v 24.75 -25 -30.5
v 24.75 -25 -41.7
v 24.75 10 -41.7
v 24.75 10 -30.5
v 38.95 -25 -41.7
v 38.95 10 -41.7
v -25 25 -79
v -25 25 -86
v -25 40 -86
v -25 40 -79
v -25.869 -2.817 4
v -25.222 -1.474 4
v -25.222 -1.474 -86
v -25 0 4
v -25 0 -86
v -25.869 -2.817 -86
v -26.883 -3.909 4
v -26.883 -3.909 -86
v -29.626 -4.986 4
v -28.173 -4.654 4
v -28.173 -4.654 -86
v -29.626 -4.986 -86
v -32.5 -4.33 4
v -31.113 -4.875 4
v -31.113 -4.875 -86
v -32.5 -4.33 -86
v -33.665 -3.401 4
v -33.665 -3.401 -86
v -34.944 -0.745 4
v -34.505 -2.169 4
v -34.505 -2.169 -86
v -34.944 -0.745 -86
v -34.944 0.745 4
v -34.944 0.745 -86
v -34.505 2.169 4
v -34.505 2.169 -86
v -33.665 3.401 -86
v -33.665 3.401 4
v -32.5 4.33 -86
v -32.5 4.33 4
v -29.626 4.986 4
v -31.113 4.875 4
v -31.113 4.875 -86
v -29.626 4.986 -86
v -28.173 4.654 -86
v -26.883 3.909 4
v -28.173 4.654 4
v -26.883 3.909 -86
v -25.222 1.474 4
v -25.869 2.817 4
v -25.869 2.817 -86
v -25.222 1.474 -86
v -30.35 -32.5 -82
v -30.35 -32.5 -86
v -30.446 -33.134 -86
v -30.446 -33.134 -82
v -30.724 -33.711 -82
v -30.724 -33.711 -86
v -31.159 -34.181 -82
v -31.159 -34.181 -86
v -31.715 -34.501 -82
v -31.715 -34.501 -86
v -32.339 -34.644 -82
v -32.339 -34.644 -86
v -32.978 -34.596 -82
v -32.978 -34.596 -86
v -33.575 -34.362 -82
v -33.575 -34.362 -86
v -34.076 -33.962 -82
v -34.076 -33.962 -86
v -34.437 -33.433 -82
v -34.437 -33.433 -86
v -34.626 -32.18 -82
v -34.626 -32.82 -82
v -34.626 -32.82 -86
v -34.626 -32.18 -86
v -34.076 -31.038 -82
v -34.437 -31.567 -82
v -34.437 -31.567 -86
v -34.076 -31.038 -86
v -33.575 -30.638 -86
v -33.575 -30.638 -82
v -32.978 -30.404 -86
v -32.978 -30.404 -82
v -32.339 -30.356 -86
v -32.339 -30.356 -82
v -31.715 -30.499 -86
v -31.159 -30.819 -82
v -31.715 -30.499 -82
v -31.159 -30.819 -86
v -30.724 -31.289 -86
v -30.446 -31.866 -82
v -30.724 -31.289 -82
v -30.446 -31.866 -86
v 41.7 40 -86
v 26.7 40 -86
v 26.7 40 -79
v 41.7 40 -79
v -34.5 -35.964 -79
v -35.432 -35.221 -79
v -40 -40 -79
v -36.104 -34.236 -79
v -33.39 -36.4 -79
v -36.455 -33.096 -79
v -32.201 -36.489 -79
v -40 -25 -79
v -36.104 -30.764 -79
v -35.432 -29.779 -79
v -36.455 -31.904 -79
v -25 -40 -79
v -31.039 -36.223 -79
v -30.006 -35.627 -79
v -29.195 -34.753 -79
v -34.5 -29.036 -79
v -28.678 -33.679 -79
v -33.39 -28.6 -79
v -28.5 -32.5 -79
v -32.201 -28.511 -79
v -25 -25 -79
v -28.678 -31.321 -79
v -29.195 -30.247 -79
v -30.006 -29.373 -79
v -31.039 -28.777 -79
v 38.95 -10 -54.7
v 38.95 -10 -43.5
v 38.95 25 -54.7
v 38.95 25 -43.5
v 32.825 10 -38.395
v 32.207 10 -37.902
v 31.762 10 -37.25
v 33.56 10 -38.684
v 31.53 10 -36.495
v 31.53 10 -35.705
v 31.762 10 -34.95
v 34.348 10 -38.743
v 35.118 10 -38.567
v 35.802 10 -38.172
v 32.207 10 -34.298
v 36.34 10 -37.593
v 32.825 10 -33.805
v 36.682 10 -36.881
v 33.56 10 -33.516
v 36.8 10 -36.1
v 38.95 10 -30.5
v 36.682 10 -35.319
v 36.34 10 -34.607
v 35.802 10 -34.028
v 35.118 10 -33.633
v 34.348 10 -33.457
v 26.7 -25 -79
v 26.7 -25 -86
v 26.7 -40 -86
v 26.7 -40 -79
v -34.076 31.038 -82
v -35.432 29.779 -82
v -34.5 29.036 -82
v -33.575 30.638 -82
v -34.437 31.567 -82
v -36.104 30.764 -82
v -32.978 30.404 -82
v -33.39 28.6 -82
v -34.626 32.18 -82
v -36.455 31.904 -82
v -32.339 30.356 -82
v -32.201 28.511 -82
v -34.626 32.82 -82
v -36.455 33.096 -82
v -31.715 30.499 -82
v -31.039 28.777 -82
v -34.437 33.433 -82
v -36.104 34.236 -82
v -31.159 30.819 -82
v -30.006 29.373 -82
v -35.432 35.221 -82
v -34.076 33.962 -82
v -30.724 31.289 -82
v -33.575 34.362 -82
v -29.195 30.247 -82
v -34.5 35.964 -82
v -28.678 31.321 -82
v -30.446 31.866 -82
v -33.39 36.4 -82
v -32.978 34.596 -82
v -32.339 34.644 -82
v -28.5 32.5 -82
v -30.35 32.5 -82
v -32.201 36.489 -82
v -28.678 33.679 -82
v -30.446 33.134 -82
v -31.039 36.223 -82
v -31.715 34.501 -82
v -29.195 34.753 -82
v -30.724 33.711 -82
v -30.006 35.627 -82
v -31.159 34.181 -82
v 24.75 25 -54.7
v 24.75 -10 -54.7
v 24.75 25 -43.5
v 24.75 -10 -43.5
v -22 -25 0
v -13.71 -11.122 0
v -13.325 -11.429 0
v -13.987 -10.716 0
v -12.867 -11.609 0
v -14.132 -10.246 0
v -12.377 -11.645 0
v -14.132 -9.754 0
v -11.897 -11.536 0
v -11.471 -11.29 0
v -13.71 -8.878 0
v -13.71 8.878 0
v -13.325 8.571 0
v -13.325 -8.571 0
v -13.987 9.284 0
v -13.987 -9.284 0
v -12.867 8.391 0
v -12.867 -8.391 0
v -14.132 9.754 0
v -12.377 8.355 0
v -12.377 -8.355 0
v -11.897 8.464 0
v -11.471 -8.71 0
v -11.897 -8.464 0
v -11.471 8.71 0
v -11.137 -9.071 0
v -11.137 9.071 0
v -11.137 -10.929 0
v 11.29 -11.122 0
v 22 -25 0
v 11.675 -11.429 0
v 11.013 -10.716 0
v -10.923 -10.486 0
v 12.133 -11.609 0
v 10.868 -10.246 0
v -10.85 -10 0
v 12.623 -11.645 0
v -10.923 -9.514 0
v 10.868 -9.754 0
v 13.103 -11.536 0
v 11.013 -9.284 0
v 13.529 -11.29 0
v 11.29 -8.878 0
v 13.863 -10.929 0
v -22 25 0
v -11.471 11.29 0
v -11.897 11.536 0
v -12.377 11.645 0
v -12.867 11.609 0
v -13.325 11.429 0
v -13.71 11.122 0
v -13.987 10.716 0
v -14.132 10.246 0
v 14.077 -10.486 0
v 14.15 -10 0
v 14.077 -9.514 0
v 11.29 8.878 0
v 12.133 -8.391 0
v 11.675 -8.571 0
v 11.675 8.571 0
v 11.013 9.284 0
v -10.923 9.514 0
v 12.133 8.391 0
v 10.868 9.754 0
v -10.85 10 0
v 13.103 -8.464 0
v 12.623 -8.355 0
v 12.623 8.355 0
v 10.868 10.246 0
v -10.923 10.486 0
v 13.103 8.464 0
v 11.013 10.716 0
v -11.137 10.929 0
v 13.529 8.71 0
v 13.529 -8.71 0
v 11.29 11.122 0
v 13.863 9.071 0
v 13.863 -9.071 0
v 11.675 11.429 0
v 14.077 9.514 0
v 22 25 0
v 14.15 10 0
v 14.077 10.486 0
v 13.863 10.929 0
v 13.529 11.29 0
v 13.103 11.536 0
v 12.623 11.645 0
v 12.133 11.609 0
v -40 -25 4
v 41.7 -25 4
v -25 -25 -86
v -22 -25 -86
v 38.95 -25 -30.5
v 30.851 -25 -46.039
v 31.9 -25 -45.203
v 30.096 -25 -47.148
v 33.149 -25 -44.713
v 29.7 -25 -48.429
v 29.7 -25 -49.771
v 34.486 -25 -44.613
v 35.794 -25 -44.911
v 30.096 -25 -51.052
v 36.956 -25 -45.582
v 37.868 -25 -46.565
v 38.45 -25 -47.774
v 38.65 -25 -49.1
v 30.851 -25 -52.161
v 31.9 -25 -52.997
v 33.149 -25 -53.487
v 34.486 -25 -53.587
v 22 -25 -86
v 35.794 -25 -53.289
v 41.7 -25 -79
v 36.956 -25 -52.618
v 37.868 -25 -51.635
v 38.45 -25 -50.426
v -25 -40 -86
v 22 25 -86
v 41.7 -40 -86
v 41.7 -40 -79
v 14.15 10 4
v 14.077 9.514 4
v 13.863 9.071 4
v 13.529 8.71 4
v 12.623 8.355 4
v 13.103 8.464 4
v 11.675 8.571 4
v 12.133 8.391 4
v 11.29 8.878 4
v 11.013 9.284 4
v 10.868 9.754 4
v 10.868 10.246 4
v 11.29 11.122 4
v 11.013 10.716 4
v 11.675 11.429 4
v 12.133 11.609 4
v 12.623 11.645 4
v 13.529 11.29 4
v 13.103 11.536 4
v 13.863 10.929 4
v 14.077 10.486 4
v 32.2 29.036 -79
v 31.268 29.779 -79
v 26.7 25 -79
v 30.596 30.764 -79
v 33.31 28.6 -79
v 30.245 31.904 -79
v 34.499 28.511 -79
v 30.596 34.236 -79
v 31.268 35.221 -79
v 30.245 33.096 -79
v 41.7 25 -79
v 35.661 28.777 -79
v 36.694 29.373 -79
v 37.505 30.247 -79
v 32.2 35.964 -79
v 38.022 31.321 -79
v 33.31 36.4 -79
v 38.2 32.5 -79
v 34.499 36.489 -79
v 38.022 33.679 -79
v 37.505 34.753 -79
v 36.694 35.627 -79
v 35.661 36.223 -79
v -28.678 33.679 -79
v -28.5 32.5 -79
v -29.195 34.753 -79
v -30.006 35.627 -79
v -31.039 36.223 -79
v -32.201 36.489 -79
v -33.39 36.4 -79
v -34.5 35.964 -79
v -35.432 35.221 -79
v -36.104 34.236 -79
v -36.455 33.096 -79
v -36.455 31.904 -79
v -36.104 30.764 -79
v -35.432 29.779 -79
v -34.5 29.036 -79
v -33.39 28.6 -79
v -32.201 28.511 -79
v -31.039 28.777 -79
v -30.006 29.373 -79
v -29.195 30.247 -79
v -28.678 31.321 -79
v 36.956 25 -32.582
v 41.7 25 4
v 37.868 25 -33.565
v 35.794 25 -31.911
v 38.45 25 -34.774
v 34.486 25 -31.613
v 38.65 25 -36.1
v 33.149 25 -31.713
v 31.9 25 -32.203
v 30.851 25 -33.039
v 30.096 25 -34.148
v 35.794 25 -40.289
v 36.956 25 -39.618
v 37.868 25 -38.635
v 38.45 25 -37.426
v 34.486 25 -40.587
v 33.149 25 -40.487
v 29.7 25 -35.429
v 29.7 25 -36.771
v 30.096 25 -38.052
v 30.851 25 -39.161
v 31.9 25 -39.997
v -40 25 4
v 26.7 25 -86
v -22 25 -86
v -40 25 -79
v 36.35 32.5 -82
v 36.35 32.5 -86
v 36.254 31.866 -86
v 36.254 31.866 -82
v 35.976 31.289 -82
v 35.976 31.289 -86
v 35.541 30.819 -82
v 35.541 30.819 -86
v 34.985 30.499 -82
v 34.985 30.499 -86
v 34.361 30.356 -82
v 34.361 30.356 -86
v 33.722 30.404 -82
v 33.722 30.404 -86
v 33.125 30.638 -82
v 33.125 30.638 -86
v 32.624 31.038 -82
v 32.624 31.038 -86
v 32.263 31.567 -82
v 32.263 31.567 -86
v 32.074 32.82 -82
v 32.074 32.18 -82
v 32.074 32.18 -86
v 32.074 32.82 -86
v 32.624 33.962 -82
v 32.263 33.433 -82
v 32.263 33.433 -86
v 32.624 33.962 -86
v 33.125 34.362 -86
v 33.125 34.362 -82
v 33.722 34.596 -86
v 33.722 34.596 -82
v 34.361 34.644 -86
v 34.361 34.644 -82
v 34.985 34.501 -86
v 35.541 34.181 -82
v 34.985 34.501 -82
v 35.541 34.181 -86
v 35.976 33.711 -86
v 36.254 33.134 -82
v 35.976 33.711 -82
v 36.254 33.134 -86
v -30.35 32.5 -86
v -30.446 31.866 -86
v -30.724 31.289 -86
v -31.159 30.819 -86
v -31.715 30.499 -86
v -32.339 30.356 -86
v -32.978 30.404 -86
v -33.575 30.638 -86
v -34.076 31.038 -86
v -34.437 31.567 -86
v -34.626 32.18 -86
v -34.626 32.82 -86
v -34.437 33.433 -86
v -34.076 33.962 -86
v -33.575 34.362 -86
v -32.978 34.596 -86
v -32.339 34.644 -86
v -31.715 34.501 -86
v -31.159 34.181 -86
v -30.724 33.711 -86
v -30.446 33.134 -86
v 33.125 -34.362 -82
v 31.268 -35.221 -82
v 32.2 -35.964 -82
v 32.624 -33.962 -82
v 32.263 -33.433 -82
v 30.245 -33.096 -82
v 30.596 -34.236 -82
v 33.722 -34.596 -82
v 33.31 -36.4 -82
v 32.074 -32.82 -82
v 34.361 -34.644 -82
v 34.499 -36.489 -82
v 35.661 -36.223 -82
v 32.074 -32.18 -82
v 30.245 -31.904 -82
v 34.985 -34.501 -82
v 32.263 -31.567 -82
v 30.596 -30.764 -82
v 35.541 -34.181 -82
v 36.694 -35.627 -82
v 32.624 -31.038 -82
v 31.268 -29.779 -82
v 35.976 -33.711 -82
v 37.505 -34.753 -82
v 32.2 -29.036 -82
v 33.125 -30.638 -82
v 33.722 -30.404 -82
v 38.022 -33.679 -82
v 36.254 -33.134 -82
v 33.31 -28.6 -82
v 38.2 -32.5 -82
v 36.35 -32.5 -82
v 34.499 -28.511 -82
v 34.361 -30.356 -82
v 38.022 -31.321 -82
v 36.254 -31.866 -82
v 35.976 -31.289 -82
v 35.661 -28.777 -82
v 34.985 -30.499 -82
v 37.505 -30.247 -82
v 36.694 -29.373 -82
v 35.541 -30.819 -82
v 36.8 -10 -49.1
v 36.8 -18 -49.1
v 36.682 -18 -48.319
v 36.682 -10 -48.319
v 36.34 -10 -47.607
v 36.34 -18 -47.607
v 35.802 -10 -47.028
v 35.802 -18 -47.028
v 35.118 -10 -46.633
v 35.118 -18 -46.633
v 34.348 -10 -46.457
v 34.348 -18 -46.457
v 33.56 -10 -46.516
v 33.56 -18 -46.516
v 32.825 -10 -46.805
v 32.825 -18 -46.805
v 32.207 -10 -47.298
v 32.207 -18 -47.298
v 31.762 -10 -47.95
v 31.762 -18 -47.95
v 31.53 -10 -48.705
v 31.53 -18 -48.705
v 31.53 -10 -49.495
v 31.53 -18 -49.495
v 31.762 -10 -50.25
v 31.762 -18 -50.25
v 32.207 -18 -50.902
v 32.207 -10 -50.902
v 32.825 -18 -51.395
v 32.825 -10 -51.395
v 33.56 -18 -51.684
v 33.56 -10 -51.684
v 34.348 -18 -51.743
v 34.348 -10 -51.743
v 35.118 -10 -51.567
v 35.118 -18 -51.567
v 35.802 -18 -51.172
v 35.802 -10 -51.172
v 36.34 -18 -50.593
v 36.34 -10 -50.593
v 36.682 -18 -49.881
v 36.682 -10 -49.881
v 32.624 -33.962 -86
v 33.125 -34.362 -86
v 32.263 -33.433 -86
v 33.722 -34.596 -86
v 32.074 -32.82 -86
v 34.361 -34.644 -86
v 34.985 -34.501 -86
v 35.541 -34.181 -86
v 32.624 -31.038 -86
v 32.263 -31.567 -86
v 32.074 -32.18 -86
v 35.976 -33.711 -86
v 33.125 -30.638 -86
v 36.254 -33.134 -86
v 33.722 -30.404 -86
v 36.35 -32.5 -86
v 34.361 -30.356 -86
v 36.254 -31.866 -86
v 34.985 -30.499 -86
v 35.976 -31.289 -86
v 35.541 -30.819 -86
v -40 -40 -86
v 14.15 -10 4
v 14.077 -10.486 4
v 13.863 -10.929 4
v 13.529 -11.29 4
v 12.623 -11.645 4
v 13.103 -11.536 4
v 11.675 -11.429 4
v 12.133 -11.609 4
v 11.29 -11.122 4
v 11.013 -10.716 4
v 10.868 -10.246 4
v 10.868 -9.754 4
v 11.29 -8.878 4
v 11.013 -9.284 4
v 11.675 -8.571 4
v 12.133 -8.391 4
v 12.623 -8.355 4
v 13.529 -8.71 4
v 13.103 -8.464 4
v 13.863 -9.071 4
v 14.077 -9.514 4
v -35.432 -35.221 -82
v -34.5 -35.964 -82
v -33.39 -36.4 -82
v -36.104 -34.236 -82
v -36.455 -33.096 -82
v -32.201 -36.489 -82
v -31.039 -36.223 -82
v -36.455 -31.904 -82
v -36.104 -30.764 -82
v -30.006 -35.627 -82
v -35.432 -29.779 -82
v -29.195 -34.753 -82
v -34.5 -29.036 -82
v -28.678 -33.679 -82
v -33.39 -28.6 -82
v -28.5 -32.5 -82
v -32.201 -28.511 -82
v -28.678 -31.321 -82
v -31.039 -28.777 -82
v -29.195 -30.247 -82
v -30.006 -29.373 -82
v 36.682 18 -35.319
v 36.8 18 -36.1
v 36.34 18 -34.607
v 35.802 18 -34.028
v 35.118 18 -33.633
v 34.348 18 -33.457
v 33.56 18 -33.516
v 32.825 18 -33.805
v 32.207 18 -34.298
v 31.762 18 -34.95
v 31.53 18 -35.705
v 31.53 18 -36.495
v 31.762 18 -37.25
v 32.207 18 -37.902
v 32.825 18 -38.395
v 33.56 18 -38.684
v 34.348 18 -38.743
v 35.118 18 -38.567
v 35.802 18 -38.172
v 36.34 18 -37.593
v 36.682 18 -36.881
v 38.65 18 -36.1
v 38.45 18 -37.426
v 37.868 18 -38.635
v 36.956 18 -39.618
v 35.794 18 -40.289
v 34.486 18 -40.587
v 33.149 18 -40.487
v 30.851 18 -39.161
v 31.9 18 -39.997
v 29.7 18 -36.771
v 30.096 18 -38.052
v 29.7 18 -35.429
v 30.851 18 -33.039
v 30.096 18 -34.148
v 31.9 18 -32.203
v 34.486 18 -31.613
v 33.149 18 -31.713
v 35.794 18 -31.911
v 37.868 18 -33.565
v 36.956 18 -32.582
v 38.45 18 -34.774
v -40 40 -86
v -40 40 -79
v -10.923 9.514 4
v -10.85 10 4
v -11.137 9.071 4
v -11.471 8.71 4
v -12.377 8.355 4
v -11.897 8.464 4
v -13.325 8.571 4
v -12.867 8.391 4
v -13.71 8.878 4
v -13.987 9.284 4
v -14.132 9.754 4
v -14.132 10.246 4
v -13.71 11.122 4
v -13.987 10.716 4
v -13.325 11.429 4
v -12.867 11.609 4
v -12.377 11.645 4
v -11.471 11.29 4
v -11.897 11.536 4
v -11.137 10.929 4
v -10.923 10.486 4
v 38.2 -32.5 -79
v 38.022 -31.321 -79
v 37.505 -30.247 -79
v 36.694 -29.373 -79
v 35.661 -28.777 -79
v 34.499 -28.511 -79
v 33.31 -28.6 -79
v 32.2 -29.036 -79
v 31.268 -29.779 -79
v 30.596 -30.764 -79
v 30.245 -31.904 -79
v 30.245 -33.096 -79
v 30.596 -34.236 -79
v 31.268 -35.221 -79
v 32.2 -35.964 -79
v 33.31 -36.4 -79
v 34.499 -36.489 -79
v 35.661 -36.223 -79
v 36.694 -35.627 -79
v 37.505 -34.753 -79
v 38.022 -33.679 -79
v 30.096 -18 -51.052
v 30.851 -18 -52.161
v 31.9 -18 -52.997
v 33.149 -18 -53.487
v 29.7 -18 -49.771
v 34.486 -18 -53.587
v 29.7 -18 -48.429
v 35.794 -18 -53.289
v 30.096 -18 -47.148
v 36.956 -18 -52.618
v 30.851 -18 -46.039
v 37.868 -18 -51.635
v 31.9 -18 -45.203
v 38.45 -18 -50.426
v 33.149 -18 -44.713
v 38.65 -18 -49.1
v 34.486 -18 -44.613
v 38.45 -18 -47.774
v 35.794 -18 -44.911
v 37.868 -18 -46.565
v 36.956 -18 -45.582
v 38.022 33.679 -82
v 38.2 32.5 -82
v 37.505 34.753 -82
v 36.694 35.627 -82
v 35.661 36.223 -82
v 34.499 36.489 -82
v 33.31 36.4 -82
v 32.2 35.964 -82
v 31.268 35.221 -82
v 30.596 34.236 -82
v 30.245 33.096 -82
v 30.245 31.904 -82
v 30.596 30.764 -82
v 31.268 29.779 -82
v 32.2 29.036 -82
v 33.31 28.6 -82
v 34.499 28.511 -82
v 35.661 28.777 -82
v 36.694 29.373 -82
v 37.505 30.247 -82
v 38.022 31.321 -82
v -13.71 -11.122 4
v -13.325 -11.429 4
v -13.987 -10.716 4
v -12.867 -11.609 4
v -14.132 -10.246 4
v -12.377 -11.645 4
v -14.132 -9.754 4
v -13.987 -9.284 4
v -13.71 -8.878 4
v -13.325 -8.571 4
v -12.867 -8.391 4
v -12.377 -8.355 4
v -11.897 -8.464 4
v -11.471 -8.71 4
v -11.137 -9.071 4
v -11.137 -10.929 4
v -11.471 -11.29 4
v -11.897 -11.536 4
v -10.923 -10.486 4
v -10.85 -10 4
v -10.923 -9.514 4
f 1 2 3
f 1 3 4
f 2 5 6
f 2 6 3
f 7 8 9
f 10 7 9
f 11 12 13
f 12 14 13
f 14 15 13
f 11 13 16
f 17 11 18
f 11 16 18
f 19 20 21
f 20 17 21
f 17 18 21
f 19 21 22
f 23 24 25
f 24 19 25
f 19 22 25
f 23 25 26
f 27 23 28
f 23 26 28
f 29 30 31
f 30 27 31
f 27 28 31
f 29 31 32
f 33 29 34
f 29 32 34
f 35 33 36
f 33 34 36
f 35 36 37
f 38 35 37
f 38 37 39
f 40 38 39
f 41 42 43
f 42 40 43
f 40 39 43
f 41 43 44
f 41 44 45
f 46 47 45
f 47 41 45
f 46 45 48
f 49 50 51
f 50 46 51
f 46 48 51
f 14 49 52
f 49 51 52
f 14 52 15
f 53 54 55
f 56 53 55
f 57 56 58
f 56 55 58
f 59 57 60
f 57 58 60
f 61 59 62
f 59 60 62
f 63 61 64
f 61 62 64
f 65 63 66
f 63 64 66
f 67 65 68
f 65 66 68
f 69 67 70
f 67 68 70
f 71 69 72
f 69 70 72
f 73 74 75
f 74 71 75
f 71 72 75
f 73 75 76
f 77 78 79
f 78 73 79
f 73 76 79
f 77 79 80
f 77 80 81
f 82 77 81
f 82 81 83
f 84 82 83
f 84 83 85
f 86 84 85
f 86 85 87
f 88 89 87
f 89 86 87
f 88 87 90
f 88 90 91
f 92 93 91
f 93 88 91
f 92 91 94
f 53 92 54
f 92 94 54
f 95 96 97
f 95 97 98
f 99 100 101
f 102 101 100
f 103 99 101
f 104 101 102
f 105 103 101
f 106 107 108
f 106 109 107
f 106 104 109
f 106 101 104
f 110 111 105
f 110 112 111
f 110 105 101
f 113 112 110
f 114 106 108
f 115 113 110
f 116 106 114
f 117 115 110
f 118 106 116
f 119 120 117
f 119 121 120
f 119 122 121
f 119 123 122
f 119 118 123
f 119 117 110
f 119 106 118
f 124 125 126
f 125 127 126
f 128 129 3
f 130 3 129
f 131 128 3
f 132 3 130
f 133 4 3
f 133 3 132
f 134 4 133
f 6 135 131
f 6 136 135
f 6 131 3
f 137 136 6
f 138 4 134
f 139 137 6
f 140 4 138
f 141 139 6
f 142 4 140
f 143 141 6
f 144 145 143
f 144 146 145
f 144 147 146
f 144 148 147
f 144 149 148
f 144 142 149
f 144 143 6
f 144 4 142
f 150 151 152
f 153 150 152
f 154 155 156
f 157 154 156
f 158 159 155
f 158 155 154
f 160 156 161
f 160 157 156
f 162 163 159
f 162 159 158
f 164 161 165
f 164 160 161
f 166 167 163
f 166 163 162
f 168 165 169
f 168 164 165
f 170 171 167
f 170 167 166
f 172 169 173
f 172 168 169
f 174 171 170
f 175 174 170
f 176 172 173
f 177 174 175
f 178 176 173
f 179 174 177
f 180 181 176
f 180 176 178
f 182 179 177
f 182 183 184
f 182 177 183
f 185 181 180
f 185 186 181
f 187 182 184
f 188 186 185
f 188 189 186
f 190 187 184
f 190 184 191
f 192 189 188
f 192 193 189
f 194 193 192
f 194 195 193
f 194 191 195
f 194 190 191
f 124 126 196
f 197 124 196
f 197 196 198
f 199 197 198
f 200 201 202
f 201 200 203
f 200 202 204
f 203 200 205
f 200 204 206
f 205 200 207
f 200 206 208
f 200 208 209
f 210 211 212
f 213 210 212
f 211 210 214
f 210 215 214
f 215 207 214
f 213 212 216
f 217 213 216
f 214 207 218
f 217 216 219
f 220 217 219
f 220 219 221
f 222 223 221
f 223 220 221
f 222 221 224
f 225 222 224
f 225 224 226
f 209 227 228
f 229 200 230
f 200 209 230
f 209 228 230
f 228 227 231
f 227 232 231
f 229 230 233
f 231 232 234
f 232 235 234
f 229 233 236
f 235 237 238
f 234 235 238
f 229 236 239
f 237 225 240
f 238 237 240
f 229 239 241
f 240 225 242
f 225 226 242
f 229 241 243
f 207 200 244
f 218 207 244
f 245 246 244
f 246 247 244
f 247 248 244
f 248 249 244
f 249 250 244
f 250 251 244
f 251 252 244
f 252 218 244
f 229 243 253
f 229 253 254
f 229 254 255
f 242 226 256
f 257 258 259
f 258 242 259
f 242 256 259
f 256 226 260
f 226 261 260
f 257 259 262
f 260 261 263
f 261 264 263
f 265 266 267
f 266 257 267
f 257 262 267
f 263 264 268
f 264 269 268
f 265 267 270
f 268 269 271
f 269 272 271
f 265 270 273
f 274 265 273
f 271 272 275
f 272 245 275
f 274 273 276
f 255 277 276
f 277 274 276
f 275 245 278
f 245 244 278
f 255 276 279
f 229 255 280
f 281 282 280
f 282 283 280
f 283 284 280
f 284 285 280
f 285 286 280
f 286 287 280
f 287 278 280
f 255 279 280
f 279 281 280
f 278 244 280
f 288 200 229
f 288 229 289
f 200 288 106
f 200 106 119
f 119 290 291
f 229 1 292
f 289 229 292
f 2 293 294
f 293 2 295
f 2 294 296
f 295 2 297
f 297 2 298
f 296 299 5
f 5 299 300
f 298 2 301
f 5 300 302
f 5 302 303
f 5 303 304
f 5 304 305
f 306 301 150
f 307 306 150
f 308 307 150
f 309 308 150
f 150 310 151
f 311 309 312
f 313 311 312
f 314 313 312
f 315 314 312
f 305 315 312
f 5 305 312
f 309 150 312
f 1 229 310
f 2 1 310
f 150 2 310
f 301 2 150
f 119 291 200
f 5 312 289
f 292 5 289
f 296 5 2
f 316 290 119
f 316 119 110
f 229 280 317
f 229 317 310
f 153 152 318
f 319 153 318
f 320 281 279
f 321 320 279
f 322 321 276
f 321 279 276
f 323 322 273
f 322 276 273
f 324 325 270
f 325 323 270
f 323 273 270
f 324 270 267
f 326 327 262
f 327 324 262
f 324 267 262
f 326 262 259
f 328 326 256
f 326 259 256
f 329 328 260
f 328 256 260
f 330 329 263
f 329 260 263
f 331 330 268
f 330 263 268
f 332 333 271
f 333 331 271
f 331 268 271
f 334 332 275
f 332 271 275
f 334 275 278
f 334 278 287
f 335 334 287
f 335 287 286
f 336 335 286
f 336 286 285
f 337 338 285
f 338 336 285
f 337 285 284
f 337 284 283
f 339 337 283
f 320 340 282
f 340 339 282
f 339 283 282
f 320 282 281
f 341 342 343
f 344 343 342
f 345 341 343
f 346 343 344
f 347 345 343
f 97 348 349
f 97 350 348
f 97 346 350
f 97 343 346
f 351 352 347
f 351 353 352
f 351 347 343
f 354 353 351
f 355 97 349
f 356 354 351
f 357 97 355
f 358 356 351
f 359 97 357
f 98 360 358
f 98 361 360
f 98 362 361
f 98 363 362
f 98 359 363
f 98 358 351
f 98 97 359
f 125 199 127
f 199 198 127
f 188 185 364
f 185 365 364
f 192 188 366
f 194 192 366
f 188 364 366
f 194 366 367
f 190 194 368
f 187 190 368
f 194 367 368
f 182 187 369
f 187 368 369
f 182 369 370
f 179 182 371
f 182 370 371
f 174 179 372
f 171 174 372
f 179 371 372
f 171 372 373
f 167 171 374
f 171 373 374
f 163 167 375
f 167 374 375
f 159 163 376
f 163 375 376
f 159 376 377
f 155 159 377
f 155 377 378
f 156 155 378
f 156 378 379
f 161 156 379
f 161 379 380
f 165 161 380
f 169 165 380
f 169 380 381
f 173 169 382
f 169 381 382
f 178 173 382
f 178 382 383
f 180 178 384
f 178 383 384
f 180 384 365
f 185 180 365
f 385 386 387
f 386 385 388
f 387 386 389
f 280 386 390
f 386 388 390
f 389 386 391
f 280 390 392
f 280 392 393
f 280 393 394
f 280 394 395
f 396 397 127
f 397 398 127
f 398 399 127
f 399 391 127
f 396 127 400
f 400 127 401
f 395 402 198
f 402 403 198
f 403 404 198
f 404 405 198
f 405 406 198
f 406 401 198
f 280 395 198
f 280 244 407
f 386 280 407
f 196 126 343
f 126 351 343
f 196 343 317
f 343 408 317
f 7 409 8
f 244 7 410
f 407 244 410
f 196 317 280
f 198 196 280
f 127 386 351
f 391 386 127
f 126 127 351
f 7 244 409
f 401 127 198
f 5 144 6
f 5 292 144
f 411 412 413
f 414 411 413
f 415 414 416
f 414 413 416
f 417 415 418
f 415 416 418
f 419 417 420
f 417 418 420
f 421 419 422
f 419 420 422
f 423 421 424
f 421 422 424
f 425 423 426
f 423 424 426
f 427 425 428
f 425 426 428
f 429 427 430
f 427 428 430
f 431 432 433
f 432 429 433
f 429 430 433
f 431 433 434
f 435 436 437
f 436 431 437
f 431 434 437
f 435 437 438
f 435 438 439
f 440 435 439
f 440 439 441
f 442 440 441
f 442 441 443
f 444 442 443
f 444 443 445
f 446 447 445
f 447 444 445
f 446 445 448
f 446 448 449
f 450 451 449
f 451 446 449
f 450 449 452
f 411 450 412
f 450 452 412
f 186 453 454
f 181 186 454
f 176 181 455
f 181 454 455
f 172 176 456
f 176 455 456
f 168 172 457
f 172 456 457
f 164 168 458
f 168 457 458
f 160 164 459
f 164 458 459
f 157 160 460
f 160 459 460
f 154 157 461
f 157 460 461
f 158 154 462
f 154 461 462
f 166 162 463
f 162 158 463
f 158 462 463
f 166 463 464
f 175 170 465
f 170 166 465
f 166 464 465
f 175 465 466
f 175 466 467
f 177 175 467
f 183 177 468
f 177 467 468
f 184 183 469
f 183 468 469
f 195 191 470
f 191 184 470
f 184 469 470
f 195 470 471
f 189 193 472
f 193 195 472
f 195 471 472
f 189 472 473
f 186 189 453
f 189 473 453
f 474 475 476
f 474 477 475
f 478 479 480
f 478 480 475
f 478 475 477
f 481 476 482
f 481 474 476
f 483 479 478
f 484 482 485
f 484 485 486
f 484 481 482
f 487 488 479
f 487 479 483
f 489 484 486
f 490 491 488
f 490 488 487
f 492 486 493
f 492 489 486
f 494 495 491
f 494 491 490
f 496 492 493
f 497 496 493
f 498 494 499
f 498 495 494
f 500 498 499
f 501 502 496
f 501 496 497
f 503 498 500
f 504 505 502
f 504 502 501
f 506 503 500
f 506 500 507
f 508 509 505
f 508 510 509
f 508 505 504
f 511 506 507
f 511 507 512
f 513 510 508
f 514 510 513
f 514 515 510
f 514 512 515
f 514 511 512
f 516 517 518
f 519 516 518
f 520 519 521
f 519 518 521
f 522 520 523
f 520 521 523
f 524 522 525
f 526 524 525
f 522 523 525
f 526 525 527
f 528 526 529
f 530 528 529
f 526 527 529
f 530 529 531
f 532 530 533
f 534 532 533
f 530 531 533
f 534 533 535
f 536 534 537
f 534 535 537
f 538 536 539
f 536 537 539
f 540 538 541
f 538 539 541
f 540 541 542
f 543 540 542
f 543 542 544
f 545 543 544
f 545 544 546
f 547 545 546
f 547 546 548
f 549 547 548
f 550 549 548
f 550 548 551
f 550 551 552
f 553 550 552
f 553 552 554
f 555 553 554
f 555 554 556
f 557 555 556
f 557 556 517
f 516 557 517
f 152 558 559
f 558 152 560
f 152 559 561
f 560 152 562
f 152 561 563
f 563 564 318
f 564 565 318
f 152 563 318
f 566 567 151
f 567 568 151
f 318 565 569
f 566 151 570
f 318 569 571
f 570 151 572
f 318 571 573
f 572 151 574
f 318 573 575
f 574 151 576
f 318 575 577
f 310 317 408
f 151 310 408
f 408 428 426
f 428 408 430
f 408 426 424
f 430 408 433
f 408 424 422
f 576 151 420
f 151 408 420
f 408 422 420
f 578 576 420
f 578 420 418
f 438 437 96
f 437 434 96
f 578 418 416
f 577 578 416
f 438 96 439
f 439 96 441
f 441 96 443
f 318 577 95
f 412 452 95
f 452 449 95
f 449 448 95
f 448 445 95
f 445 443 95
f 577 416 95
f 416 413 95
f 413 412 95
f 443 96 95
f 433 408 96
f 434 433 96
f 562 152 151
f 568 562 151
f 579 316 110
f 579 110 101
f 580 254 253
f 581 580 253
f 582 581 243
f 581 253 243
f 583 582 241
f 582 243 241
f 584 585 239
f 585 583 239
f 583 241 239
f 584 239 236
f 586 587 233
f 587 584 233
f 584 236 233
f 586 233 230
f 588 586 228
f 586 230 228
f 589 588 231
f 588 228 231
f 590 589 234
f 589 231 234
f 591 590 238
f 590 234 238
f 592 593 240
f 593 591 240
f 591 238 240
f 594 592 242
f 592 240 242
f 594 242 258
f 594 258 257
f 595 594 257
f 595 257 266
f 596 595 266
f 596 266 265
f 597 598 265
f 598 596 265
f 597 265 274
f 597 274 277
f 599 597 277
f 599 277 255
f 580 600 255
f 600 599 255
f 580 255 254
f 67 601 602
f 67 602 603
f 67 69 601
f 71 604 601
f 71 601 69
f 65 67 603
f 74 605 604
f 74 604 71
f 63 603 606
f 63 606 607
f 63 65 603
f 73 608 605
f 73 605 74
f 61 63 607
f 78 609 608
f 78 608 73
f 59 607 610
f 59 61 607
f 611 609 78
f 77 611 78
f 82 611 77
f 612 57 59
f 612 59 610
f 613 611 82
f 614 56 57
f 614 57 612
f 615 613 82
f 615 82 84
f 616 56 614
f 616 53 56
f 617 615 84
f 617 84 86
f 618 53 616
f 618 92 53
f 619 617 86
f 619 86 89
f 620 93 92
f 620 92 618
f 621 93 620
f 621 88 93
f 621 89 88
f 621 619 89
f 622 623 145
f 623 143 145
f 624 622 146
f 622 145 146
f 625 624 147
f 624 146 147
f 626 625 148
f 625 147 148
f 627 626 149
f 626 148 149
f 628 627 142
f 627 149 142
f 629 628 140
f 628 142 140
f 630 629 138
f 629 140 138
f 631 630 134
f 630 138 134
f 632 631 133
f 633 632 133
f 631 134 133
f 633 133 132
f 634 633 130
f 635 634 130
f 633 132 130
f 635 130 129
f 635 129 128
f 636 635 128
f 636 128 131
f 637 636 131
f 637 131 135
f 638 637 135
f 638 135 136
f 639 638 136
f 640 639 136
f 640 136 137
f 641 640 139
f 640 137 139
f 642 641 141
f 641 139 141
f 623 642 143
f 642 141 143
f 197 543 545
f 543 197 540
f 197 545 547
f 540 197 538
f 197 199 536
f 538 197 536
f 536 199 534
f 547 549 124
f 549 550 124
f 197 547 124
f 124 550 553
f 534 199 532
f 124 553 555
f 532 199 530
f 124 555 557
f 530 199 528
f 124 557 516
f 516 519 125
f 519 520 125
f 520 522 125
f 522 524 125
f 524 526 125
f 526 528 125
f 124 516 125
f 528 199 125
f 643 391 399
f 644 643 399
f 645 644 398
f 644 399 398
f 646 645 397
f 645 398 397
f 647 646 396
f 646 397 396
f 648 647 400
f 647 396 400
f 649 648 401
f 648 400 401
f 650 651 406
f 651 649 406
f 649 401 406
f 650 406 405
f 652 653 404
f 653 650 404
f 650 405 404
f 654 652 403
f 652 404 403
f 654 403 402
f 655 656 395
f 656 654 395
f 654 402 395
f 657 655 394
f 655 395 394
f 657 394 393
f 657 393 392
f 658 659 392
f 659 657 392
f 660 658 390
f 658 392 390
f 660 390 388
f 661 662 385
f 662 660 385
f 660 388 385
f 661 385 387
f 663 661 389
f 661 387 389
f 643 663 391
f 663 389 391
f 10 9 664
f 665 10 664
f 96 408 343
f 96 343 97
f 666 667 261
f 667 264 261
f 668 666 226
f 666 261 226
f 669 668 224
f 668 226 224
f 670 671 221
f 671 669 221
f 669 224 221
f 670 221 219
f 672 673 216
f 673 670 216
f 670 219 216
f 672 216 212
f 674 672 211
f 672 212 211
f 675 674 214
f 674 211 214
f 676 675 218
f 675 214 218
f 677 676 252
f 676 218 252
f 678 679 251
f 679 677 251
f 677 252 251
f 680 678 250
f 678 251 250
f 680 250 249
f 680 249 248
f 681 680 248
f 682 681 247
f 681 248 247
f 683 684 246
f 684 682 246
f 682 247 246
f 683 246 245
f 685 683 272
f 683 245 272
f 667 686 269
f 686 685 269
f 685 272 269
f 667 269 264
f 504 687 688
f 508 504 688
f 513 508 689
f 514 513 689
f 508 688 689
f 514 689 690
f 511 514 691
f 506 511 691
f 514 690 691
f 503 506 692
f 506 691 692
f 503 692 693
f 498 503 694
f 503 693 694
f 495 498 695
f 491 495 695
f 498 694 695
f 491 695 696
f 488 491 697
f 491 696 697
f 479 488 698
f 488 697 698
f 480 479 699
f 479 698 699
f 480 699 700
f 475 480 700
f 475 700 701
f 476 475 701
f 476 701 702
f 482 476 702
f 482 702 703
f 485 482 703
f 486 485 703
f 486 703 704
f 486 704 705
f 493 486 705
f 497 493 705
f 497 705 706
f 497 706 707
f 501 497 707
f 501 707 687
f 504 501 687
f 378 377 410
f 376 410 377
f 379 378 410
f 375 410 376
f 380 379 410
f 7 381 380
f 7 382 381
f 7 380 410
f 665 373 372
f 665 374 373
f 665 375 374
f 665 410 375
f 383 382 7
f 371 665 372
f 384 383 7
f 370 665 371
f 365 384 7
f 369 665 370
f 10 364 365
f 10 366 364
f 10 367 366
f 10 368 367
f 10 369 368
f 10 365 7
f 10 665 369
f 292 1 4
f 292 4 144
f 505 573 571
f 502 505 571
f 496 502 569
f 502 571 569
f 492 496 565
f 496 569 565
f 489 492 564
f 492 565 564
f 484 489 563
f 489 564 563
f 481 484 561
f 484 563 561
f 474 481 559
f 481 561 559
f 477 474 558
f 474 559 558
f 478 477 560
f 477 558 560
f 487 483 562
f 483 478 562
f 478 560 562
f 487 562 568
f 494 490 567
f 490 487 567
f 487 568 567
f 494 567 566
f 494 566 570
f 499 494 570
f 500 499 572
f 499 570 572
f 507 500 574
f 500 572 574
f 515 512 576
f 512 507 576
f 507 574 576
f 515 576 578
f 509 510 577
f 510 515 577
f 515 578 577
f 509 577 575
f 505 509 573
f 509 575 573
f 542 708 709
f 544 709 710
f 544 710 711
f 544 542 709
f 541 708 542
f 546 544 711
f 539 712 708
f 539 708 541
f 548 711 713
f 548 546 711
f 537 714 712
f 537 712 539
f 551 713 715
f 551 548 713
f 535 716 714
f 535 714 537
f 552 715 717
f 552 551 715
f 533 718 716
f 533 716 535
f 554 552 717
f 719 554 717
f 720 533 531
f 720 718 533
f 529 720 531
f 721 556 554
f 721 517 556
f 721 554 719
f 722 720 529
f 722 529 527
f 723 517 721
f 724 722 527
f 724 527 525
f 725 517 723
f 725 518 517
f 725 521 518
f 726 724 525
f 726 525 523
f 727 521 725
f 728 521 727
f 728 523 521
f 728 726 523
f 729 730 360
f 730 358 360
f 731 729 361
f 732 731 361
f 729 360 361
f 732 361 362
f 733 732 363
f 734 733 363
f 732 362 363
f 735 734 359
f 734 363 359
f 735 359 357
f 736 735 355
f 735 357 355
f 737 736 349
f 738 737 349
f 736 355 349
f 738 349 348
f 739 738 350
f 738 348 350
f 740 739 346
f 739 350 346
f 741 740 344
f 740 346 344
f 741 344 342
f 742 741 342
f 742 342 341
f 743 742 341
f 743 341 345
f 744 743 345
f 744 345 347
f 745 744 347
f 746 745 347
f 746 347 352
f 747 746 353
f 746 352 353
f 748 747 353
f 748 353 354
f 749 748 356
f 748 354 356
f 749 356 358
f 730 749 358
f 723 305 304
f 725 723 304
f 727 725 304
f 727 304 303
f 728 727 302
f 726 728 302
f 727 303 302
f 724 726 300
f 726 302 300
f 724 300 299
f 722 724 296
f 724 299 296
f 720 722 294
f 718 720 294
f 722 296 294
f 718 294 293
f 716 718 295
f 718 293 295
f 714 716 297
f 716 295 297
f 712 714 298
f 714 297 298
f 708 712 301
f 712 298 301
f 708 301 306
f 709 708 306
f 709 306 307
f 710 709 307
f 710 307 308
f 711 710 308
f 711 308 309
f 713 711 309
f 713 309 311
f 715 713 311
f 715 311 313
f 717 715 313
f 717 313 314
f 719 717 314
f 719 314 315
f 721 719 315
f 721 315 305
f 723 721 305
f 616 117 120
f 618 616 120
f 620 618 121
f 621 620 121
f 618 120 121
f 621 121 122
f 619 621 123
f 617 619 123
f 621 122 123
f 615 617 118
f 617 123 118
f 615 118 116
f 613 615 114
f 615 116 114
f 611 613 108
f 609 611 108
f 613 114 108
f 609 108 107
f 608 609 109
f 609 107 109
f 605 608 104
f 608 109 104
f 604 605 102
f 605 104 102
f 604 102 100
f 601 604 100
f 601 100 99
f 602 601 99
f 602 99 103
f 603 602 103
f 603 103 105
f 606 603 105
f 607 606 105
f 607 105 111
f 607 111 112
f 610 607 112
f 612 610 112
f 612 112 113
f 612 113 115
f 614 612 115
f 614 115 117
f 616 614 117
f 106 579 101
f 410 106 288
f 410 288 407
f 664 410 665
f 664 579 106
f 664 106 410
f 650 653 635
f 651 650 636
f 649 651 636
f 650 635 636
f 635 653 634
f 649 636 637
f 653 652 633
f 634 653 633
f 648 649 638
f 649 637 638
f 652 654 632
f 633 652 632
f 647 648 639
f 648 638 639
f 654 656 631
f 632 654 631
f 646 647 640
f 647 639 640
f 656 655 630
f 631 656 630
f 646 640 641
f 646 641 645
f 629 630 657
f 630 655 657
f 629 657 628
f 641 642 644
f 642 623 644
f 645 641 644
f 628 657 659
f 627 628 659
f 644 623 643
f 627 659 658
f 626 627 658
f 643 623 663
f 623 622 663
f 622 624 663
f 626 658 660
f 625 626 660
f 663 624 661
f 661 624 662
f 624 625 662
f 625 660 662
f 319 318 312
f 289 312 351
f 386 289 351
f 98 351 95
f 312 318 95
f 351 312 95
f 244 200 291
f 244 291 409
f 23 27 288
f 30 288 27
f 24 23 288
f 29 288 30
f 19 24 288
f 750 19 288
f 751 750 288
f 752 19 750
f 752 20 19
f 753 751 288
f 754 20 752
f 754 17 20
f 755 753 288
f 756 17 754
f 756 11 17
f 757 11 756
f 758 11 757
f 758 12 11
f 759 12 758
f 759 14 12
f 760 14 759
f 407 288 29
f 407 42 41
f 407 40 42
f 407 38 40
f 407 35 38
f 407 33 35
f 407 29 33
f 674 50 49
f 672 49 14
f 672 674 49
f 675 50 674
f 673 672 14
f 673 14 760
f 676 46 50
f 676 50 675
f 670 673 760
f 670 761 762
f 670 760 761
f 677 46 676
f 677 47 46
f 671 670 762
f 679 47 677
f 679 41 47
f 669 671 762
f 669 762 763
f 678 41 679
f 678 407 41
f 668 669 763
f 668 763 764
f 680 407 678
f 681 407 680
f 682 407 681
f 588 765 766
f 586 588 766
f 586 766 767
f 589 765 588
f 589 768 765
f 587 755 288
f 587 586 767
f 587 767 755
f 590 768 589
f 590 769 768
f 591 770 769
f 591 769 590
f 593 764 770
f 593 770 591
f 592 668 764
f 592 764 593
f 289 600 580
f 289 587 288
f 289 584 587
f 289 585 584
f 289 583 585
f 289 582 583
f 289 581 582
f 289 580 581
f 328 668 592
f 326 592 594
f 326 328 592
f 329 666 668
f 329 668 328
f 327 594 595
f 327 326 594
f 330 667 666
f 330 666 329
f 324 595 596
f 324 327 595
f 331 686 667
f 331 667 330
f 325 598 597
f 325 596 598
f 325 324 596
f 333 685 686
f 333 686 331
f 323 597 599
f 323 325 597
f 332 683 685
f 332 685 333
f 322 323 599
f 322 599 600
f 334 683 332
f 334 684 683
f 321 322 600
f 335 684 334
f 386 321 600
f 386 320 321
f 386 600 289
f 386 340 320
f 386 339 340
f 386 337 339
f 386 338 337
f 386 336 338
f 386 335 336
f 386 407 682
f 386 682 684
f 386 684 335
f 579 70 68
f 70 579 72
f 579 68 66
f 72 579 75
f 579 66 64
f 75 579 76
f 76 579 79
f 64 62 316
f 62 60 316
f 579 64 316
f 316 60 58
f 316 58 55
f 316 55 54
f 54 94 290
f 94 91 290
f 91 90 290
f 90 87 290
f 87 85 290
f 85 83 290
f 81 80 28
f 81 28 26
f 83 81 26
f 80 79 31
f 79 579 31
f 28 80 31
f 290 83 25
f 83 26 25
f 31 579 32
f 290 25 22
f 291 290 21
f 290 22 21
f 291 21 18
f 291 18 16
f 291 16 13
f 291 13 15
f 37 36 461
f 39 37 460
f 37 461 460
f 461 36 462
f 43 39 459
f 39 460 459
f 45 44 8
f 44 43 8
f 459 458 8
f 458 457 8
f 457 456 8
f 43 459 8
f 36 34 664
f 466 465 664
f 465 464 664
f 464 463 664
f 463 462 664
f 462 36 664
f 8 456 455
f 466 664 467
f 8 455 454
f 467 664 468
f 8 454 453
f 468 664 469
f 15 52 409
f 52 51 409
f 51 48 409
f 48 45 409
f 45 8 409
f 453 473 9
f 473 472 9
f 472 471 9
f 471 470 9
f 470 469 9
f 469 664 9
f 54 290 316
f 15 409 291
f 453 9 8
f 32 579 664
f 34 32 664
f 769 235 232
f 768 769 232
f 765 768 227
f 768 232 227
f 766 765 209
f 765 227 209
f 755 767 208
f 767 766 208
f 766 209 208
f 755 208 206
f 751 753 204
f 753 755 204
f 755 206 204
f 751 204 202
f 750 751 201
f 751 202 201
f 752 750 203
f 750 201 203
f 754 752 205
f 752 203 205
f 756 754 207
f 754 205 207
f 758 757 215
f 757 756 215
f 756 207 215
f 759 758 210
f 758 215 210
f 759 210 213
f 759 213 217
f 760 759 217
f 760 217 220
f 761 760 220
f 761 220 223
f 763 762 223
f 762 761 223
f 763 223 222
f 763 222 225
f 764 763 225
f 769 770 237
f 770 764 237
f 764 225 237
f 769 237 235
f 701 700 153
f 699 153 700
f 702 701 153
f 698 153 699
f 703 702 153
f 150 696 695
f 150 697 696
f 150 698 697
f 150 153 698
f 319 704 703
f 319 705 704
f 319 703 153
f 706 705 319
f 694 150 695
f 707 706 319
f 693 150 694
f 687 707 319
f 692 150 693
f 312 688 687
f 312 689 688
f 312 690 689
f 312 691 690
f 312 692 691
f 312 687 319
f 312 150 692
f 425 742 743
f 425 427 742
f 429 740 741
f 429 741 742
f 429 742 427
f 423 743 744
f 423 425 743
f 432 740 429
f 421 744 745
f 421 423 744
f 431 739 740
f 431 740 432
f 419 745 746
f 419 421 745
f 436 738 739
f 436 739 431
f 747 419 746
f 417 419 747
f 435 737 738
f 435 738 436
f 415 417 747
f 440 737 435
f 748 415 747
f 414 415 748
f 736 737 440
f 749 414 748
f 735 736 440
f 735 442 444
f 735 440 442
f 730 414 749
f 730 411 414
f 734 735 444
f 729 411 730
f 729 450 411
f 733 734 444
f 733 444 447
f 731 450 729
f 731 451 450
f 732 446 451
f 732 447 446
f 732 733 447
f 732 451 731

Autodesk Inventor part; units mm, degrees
sketch "S-ProbeHead-BaseSkizze" plane through (0, 0, 0) normal (0, 0, 1) x (1, 0, 0)
  line L0 (-40, 40) -> (40, 40)
  line L1 (40, 40) -> (40, -40)
  line L2 (40, -40) -> (-40, -40)
  line L3 (-40, -40) -> (-40, 40)
  line L4 (-40, 40) -> (40, -40) construction
  line L5 (40, 40) -> (-40, -40) construction
  line L6 (-56.34, 0) -> (58.04, 0) construction
  circle A0 centre (-30, 0) radius 5
  line L7 (0, 83.0683) -> (0, -88.0384) construction
  line L8 (-7.5, 58.6245) -> (-7.5, -60.8735) construction
  line L9 (-16, 21) -> (16, 21) construction
  line L10 (16, 21) -> (16, -21) construction
  line L11 (16, -21) -> (-16, -21) construction
  line L12 (-16, -21) -> (-16, 21) construction
  line L13 (-16, 21) -> (16, -21) construction
  line L14 (16, 21) -> (-16, -21) construction
  circle A1 centre (-12.5, -10) radius 1.65
  circle A2 centre (-12.5, 10) radius 1.65
  circle A3 centre (12.5, -10) radius 1.65
  circle A4 centre (12.5, 10) radius 1.65
  line L15 (-20, 57.6709) -> (-20, -63.5946)
  line L16 (7.5, 58.6245) -> (7.5, -60.8735) construction
  line L17 (20, 57.6709) -> (20, -63.5946)
  line L18 (41.7, 25) -> (-40, 25)
  line L19 (-40, 25) -> (-40, -25)
  line L20 (-40, -25) -> (41.7, -25)
  line L21 (41.7, -25) -> (41.7, 25)
  line L22 (22, 25) -> (22, -25)
  line L23 (-22, -25) -> (-22, 25)
  point P0 (0, 0)
  point P1 (41.7, 0)
  dimension "d1" = 80
  dimension "d2" = 80
  dimension "d4" = 10
  dimension "d6" = 30
  dimension "d20" = 7.5
  dimension "d21" = 32
  dimension "d22" = 42
  dimension "d23" = 3.3
  dimension "d24" = 10
  dimension "d25" = 12.5
  dimension "d26" = 20
  dimension "d27" = 50
  dimension "d30" = 20
  dimension "d31" = 21.7
  dimension "d32" = 2
  dimension "d37" = 2
extrude "BasePlate" add sketch "S-ProbeHead-BaseSkizze" along normal blind 4 contours L18 L23 L20 L3 | L18 L17 L20 L15 | L15 L20 L23 L18 | L18 L22 L20 L17 | L18 L21 L20 L1 | L1 L20 L22 L18
ref_plane "Endfläche-ProbeHeadarme" through (0, 0, -86) normal (0, 0, 1) x (1, 0, 0)
ref_plane "ProfilDownside" through (0, 0, -56) normal (0, 0, 1) x (1, 0, 0)
extrude "Arms" add sketch "S-ProbeHead-BaseSkizze" against normal up to surface (86 mm away) contours L18 L23 L20 L3 | L18 L21 L20 L1 | L1 L20 L22 L18
ref_plane "Z-UpperBelt" through (0, 0, -36.1) normal (0, 0, 1) x (1, 0, 0)
ref_plane "Z-LowerBelt" through (0, 0, -49.1) normal (0, 0, 1) x (1, 0, 0)
ref_plane "X-Belts" through (26.75, 0, 0) normal (1, 0, 0) x (0, 1, 0)
sketch "S-Tensioners" plane through (-40, -25, 4) normal (0, -1, 0) x (1, 0, 0)
  line L0 (64.75, -47.5) -> (78.95, -47.5)
  line L1 (78.95, -47.5) -> (78.95, -58.7)
  line L2 (78.95, -58.7) -> (64.75, -58.7)
  line L3 (64.75, -58.7) -> (64.75, -47.5)
  line L4 (64.75, -47.5) -> (78.95, -58.7) construction
  line L5 (78.95, -47.5) -> (64.75, -58.7) construction
  line L6 (71.85, -74) -> (71.85, 12.5724) construction
  line L7 (-16.34, -40.1) -> (98.04, -40.1) construction
  line L8 (-16.34, -53.1) -> (98.04, -53.1) construction
  circle A0 centre (74.15, -53.1) radius 2.65
  line L9 (64.75, -34.5) -> (78.95, -34.5)
  line L10 (78.95, -34.5) -> (78.95, -45.7)
  line L11 (78.95, -45.7) -> (64.75, -45.7)
  line L12 (64.75, -45.7) -> (64.75, -34.5)
  line L13 (64.75, -34.5) -> (78.95, -45.7) construction
  line L14 (78.95, -34.5) -> (64.75, -45.7) construction
  circle A1 centre (74.15, -40.1) radius 2.65
  circle A2 centre (74.15, -40.1) radius 4.5
  circle A3 centre (74.15, -53.1) radius 4.5
  line L15 (66.75, 33.0869) -> (66.75, -110.5145) construction
  point P0 (40, -4)
  point P1 (78.95, -40.1)
  point P2 (78.95, -53.1)
  dimension "d38" = 14.2
  dimension "d39" = 11.2
  dimension "d42" = 5.3
  dimension "d43" = 14.2
  dimension "d44" = 11.2
  dimension "d45" = 5.3
  dimension "d53" = 4.8
  dimension "d54" = 4.8
  dimension "d55" = 9
  dimension "d56" = 9
  dimension "d58" = 7.4
  dimension "d59" = 7.4
extrude "Ex-Tensioners1-Holes" cut sketch "S-Tensioners" against normal blind 50 contours A0 | A1
extrude "Ex-Tensioners2-SlideVolume" cut sketch "S-Tensioners" along normal blind 35 from surface at -50 contours L0 L1 L2 L3 | A3
extrude "Ex-Tensioners3-SlideVolume" cut sketch "S-Tensioners" against normal blind 35 contours L9 L10 L11 L12 | A2
extrude "Ex-Tensioners4-SrewHead" cut sketch "S-Tensioners" against normal blind 7 contours A3
extrude "Ex-Tensioners5-SrewHead" cut sketch "S-Tensioners" along normal blind 7 from surface at -50 contours A2
sketch "S-Anschraubpunkte-ProbeAntenna" plane through (0, 0, -86) normal (0, 0, 1) x (1, 0, 0)
  line L0 (-56.34, 0) -> (58.04, 0) construction
  line L1 (0, 35) -> (0, -35) construction
  line L2 (41.7, 25) -> (-40, 25) projected
  line L3 (41.7, -25) -> (41.7, 25) projected
  line L4 (-40, -25) -> (41.7, -25) projected
  line L5 (-40, 25) -> (-40, -25) projected
  line L6 (41.7, 25) -> (26.7, 25)
  line L7 (26.7, 25) -> (26.7, 40)
  line L8 (26.7, 40) -> (41.7, 40)
  line L9 (41.7, 40) -> (41.7, 25)
  line L10 (22, -25) -> (22, 25) projected
  line L11 (22, 25) -> (22, -25) projected
  line L12 (-22, 25) -> (-22, -25) projected
  line L13 (-22, -25) -> (-22, 25) projected
  line L14 (41.7, 32.5) -> (26.7, 32.5) construction
  line L15 (34.2, 40) -> (34.2, 25) construction
  circle A0 centre (34.2, 32.5) radius 2.15
  circle A1 centre (34.2, 32.5) radius 4
  line L16 (0.85, 53.9557) -> (0.85, -47.9335) construction
  line L17 (-40, 25) -> (-25, 25)
  line L18 (-25, 25) -> (-25, 40)
  line L19 (-25, 40) -> (-40, 40)
  line L20 (-40, 40) -> (-40, 25)
  circle A2 centre (-32.5, 32.5) radius 2.15
  circle A3 centre (-32.5, 32.5) radius 4
  line L21 (41.7, -25) -> (26.7, -25)
  line L22 (26.7, -25) -> (26.7, -40)
  line L23 (26.7, -40) -> (41.7, -40)
  line L24 (41.7, -40) -> (41.7, -25)
  circle A4 centre (34.2, -32.5) radius 2.15
  circle A5 centre (34.2, -32.5) radius 4
  line L25 (-40, -40) -> (-40, -25)
  line L26 (-25, -40) -> (-40, -40)
  line L27 (-40, -25) -> (-25, -25)
  line L28 (-25, -25) -> (-25, -40)
  circle A6 centre (-32.5, -32.5) radius 4
  circle A7 centre (-32.5, -32.5) radius 2.15
  point P0 (0, 0)
  dimension "d67" = 15
  dimension "d68" = 15
  dimension "d69" = 4.3
  dimension "d70" = 8
  dimension "d71" = 81.7
  dimension "d72" = 40.85
  dimension "d75" = 65
  dimension "d76" = 66.7
extrude "Ex-Anschraubpunkte-M4" add sketch "S-Anschraubpunkte-ProbeAntenna" along normal blind 7 contours L2 L7 L8 L9 | L24 L23 L22 L4 | L2 L20 L19 L18 | L28 L26 L25 L4 | A1 | A3 | A5 | A6
extrude "Ex-Anschraubpunkt-M4-ScrewHead" cut sketch "S-Anschraubpunkte-ProbeAntenna" against normal blind 3 from surface at 7 contours A1 | A3 | A5 | A6
ref_plane "ProfilTopSide" through (0, 0, -16) normal (0, 0, 1) x (1, 0, 0)
equation "\"d43\" = d38"
equation "\"d44\" = d39"
equation "\"d45\" = d42"
equation "\"d53\" = d54"
equation "\"d55\" = d56"
equation "\"d58\" = d59"
equation "\"d72\" = 0.5 * d71"
properties part number "ProbeHead-BaseBody V1"
